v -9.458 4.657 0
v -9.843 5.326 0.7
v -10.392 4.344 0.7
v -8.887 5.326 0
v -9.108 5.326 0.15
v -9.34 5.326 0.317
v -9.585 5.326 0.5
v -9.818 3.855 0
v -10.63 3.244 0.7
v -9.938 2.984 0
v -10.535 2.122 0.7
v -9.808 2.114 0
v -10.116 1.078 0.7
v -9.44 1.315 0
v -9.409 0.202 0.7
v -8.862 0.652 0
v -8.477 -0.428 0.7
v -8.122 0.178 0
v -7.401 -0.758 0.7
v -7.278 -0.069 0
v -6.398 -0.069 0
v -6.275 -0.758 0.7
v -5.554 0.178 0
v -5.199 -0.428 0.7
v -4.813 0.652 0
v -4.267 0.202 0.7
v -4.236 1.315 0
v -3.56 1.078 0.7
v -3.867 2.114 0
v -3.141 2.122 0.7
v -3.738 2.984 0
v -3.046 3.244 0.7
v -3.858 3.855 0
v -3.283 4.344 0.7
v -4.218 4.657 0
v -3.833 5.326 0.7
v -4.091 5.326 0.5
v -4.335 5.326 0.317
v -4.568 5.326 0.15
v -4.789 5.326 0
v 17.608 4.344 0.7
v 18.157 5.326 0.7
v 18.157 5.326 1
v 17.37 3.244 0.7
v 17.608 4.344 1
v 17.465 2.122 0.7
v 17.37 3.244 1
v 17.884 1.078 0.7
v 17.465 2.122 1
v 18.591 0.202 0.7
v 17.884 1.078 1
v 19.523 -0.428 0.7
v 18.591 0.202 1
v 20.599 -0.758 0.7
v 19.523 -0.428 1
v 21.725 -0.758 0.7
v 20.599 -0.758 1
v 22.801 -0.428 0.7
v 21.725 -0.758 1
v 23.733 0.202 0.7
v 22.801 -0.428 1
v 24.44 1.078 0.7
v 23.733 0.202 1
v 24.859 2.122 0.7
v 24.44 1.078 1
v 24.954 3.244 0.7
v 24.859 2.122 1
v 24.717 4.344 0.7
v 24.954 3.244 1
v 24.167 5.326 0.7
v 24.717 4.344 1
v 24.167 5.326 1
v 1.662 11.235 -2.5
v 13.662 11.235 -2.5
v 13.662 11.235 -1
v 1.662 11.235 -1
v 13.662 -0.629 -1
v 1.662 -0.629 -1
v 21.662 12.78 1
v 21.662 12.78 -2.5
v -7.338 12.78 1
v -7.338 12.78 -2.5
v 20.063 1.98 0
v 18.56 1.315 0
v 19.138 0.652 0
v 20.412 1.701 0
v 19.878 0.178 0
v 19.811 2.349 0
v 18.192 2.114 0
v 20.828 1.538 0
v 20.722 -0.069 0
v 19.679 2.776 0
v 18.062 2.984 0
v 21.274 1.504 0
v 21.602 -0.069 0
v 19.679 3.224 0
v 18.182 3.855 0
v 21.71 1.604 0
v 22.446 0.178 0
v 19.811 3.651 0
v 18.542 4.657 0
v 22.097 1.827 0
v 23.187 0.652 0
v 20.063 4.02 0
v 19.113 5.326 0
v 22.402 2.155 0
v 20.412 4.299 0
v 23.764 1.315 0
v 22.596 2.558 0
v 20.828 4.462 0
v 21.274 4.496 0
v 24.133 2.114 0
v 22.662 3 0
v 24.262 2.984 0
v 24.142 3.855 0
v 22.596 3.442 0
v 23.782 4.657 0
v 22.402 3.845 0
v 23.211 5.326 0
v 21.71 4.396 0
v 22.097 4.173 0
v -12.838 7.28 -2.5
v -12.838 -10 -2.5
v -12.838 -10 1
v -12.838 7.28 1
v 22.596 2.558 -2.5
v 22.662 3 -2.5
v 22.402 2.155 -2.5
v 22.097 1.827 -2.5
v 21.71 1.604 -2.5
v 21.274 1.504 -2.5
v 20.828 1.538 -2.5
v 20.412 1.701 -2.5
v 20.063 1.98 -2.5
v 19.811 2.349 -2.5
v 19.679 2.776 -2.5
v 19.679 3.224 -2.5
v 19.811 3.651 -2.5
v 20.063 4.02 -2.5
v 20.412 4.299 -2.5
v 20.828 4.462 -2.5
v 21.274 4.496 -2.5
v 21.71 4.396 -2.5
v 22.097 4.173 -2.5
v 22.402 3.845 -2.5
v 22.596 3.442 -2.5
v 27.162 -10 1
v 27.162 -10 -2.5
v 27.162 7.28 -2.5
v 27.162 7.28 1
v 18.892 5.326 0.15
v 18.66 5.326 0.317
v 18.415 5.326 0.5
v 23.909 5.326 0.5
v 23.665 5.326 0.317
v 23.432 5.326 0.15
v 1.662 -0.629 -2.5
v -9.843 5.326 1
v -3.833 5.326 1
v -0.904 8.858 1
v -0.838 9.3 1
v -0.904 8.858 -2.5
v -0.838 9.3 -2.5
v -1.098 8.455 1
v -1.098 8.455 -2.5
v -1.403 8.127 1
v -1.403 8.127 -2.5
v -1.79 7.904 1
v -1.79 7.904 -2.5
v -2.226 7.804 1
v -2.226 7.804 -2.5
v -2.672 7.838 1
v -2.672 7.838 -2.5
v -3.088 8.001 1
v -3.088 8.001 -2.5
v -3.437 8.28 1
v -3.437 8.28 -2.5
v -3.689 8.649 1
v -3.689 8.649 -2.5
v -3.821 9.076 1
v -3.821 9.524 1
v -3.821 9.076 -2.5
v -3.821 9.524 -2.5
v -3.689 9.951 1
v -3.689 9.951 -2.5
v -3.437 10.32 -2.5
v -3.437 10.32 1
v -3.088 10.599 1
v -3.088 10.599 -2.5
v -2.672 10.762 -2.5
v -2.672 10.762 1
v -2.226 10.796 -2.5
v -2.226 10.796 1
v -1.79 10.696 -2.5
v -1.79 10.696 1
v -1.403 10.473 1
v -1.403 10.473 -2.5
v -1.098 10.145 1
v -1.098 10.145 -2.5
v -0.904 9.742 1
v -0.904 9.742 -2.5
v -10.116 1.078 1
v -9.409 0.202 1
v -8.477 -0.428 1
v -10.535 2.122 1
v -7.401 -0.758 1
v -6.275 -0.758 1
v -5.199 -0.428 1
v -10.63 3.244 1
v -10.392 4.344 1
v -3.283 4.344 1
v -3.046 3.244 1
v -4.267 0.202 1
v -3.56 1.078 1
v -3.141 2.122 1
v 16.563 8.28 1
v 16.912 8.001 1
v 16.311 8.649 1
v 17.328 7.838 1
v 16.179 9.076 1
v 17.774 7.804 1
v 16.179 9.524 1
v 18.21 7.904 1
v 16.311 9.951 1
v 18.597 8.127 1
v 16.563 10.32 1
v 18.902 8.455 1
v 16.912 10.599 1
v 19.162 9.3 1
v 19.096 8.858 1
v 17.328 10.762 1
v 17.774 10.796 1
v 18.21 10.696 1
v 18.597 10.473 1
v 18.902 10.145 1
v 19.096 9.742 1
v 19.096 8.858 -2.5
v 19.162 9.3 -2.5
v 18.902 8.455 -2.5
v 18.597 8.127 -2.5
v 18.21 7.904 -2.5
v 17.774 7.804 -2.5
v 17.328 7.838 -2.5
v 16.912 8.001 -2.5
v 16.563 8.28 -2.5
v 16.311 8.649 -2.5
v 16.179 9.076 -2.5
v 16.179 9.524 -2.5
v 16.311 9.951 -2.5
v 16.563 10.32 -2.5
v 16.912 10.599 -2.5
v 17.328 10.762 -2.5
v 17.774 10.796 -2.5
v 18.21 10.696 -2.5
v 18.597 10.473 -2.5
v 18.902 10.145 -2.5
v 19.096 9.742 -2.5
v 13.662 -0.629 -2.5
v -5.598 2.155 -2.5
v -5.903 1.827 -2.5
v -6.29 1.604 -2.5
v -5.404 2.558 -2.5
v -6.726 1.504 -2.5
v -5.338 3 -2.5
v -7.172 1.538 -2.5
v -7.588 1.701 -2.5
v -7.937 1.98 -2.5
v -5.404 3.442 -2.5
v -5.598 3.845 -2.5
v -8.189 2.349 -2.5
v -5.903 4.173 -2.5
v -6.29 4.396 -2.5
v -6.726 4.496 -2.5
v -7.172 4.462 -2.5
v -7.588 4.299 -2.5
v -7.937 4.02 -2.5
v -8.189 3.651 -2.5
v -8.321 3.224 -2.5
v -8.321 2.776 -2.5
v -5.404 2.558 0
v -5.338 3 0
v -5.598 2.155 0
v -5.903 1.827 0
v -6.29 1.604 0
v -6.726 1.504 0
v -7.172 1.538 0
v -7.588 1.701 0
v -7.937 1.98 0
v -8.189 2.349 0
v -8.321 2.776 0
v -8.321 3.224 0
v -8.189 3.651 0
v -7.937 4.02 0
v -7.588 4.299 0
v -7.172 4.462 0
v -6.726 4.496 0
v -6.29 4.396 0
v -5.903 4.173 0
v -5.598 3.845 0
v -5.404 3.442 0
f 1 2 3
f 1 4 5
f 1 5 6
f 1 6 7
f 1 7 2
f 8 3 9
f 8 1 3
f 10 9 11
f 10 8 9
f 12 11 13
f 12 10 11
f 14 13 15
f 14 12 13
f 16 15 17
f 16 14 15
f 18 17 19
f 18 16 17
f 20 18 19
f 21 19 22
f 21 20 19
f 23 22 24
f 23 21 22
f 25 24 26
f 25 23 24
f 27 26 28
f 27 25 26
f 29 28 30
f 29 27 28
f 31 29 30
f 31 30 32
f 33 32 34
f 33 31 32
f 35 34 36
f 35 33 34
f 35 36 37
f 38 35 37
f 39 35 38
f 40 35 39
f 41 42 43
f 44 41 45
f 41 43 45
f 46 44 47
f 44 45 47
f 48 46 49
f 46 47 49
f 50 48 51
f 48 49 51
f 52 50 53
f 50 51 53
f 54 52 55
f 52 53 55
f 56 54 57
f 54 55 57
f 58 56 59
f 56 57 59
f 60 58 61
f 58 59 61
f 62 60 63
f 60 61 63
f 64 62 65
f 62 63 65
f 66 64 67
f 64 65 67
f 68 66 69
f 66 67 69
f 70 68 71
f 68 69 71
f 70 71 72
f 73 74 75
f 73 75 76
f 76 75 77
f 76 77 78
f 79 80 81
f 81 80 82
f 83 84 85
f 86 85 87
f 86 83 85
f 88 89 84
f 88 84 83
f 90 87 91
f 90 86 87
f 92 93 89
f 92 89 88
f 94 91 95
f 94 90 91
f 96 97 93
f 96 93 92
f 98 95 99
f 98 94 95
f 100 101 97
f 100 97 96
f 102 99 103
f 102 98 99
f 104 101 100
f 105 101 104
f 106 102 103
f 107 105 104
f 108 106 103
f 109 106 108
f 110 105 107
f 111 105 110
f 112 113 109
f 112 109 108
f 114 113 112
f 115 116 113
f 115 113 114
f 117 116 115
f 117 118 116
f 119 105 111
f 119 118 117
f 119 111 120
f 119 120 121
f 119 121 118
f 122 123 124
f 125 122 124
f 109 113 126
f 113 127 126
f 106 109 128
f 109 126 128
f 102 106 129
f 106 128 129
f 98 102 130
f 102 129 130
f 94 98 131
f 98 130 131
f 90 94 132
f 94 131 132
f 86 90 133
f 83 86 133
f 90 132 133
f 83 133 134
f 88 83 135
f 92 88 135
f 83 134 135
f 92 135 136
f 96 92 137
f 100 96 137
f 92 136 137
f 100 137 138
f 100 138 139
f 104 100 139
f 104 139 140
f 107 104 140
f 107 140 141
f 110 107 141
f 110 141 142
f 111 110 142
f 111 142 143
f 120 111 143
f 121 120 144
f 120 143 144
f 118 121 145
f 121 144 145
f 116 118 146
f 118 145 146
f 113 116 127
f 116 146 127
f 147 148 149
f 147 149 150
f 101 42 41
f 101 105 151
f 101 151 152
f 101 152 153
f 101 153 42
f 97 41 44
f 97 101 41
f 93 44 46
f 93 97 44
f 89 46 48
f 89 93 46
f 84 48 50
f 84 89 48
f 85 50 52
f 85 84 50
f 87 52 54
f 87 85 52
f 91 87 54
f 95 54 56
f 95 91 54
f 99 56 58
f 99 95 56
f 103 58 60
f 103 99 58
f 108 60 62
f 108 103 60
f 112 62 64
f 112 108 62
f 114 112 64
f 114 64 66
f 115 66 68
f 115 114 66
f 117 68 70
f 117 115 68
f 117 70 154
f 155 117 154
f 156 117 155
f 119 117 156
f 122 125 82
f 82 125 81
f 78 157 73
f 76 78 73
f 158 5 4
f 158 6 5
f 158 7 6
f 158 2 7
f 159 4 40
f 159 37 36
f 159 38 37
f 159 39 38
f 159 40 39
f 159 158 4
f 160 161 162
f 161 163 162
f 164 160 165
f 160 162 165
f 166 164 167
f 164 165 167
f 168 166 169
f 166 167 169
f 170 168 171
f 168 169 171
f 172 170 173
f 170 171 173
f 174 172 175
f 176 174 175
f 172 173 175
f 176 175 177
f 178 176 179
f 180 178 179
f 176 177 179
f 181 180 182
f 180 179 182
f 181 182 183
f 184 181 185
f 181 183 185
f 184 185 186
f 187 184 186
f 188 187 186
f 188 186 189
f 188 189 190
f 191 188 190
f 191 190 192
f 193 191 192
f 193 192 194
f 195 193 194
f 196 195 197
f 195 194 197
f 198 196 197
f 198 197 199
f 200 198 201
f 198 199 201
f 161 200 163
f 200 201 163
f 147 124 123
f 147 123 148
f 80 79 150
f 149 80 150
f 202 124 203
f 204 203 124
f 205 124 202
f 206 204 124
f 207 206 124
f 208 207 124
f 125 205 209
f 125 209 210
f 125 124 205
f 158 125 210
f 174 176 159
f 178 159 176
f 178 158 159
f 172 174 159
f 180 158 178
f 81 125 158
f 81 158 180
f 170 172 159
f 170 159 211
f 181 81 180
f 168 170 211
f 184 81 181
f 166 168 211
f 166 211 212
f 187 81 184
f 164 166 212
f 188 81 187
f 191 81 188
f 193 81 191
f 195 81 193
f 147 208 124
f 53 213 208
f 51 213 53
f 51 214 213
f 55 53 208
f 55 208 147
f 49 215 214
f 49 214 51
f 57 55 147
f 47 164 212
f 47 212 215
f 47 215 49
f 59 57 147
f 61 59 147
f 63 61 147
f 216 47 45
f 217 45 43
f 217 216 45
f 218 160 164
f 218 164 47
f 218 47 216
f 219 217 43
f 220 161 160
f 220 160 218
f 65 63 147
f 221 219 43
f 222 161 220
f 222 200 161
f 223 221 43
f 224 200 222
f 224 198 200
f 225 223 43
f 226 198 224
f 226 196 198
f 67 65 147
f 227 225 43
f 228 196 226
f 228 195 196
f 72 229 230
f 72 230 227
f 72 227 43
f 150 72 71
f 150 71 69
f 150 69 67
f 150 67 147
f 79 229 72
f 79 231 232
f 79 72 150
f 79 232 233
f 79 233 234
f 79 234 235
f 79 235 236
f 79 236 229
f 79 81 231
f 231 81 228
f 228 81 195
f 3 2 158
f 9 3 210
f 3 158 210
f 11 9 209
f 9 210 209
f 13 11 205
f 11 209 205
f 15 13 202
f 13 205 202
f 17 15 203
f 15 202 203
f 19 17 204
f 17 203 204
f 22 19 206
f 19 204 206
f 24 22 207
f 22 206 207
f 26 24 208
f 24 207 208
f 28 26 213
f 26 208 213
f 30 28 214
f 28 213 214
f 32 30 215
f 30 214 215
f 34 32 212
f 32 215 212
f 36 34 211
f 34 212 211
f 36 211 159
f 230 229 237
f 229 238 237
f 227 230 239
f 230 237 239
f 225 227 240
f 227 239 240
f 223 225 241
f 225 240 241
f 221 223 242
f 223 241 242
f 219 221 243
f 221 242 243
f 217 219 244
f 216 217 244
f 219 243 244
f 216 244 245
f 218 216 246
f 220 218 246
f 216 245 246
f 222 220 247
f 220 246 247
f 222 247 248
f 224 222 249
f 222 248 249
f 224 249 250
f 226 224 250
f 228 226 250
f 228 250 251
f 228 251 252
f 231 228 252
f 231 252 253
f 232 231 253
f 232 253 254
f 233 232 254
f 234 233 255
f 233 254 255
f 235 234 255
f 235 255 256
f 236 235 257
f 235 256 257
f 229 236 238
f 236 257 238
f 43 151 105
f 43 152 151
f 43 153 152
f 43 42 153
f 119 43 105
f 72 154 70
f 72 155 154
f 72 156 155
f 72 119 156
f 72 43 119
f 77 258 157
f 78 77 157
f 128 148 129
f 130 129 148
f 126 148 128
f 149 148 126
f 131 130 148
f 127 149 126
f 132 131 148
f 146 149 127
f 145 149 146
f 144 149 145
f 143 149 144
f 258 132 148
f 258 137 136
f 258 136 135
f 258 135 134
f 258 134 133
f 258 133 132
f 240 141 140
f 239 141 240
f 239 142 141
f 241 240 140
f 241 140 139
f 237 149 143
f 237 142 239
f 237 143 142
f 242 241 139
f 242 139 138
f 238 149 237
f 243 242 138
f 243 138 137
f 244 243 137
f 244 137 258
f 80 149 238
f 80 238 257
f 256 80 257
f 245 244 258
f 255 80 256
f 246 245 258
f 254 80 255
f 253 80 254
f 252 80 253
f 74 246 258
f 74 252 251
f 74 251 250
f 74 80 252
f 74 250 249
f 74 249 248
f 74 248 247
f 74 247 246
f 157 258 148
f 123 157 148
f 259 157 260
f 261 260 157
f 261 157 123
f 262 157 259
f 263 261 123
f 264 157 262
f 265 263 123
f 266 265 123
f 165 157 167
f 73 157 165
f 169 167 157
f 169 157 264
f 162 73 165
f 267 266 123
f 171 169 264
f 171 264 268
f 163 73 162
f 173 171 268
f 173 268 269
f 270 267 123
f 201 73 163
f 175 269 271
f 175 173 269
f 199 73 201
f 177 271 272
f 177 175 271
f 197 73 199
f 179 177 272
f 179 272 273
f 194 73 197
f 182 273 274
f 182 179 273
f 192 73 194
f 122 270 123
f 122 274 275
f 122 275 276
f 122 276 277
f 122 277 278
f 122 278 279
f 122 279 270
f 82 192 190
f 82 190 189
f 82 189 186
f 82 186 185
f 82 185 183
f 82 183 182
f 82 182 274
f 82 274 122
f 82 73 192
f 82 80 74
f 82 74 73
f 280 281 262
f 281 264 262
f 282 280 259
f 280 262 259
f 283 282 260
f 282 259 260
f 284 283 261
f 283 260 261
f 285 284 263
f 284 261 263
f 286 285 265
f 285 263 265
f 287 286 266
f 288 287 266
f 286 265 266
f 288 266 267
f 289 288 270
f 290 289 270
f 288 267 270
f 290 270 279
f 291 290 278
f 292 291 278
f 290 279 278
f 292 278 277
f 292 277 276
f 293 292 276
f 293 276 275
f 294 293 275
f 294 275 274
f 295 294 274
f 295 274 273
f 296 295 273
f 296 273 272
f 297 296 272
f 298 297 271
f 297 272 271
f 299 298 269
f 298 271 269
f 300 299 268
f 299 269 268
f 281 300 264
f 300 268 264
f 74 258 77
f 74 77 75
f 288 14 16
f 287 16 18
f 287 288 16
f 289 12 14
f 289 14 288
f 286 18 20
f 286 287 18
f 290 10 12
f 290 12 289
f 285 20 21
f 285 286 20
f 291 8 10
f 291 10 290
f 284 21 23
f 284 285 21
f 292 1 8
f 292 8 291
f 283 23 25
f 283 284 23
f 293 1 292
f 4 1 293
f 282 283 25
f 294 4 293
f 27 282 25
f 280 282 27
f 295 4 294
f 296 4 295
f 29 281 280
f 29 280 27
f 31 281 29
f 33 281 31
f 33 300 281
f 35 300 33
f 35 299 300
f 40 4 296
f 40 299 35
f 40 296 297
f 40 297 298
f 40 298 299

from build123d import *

# Parameters (mm, degrees)
SKETCH_1_W          = 40
SKETCH_1_H          = 2.5
EXTRUDE_1_DEPTH     = 18.5
SKETCH_2_R          = 1.5
CUT_EXTRUDE_1_DEPTH = 33.958808433
SKETCH_3_R          = 1.5
CUT_EXTRUDE_2_DEPTH = 40
SKETCH_4_W          = 40
SKETCH_4_H          = 5.719865779
CUT_EXTRUDE_3_DEPTH = 40
SKETCH_5_W          = 40
SKETCH_5_H          = 12.780134221
EXTRUDE_2_DEPTH     = 1
SKETCH_6_R          = 1.5
CUT_EXTRUDE_4_DEPTH = 31.221927206
SKETCH_8_W          = 40
SKETCH_8_H          = 3.5
EXTRUDE_3_DEPTH     = 5
SKETCH_9_R          = 3.8
CUT_EXTRUDE_5_DEPTH = 1
SKETCH_10_W         = 12
SKETCH_10_H         = 17.780134221
CUT_EXTRUDE_6_DEPTH = 1.5
CHAMFER_3_SIZE      = 0.7
CUT_EXTRUDE_7_DEPTH = 31.221927206
SKETCH_12_W         = 40
SKETCH_12_H         = 1.953894505
EXTRUDE_5_DEPTH     = 2
SKETCH_13_W         = 40
SKETCH_13_H         = 3.5
EXTRUDE_6_DEPTH     = 5
SKETCH_14_W         = 12
SKETCH_14_H         = 4.371099825
EXTRUDE_7_DEPTH     = 2
SKETCH_15_W         = 12
SKETCH_15_H         = 1.544999831
EXTRUDE_8_DEPTH     = 2


with BuildPart() as part:
    # Эскиз1 → Бобышка-Вытянуть1 (new body)
    with BuildSketch(Plane(origin=(0, 0, 0), x_dir=(1, 0, 0), z_dir=(0, 1, 0))):
        with Locations((7.162162162, 1.25)):
            Rectangle(SKETCH_1_W, SKETCH_1_H)
    extrude(amount=EXTRUDE_1_DEPTH)

    # Эскиз2 → Вырез-Вытянуть1 (cut, through all)
    with BuildSketch(Plane.XY):
        with Locations((-6.837837838, 3)):
            Circle(SKETCH_2_R)
        with Locations((21.162162162, 3)):
            Circle(SKETCH_2_R)
    extrude(amount=-CUT_EXTRUDE_1_DEPTH, mode=Mode.SUBTRACT)

    # Эскиз3 → Вырез-Вытянуть2 (cut)
    with BuildSketch(Plane.XY):
        with Locations((-2.337837838, 9.3)):
            Circle(SKETCH_3_R)
        with Locations((17.662162162, 9.3)):
            Circle(SKETCH_3_R)
    extrude(amount=-CUT_EXTRUDE_2_DEPTH, mode=Mode.SUBTRACT)

    # Эскиз4 → Вырез-Вытянуть3 (cut)
    with BuildSketch(Plane.XY):
        with Locations((7.162162162, 15.640067111)):
            Rectangle(SKETCH_4_W, SKETCH_4_H)
    extrude(amount=-CUT_EXTRUDE_3_DEPTH, mode=Mode.SUBTRACT)

    # Эскиз5 → Бобышка-Вытянуть2 (add)
    with BuildSketch(Plane.XY):
        with Locations((7.162162162, 6.390067111)):
            Rectangle(SKETCH_5_W, SKETCH_5_H)
    extrude(amount=EXTRUDE_2_DEPTH)

    # Эскиз6 → Вырез-Вытянуть4 (cut, through all)
    with BuildSketch(Plane(origin=(0, 0, -2.5), x_dir=(-1, 0, 0), z_dir=(0, 0, -1))):
        with Locations(Location((-17.662162162, 9.3, 0), (0, 0, 180))):
            Circle(SKETCH_6_R)
        with Locations(Location((2.337837838, 9.3, 0), (0, 0, 180))):
            Circle(SKETCH_6_R)
        with Locations(Location((6.837837838, 3, 0), (0, 0, 180))):
            Circle(SKETCH_6_R)
        with Locations(Location((-21.162162162, 3, 0), (0, 0, 180))):
            Circle(SKETCH_6_R)
    extrude(amount=-CUT_EXTRUDE_4_DEPTH, mode=Mode.SUBTRACT)

    # Эскиз8 → Бобышка-Вытянуть3 (add)
    with BuildSketch(Plane.XZ):
        with Locations((7.162162162, -0.75)):
            Rectangle(SKETCH_8_W, SKETCH_8_H)
    extrude(amount=EXTRUDE_3_DEPTH)

    # Эскиз9 → Вырез-Вытянуть5 (cut)
    with BuildSketch(Plane.XY.offset(1)):
        with Locations((-6.837837838, 3)):
            Circle(SKETCH_9_R)
        with Locations((21.162162162, 3)):
            Circle(SKETCH_9_R)
    extrude(amount=-CUT_EXTRUDE_5_DEPTH, mode=Mode.SUBTRACT)

    # Эскиз10 → Вырез-Вытянуть6 (cut)
    with BuildSketch(Plane(origin=(0, 0, -2.5), x_dir=(-1, 0, 0), z_dir=(0, 0, -1))):
        with Locations((-7.662162162, 3.890067111)):
            Rectangle(SKETCH_10_W, SKETCH_10_H)
    extrude(amount=-CUT_EXTRUDE_6_DEPTH, mode=Mode.SUBTRACT)

    # Фаска3
    chamfer_3_edges = [part.edges().sort_by_distance(p)[0] for p in [
        (-10.637837838, 3, 0),
        (17.362162162, 3, 0),
    ]]
    chamfer(chamfer_3_edges, length=CHAMFER_3_SIZE)

    # Эскиз11 → Вырез-Вытянуть7 (cut, through all)
    with BuildSketch(Plane.XY.offset(1)):
        Polygon((-12.837837838, 12.780134221), (-12.837837838, 7.280134221), (-7.337837838, 12.780134221), align=None)
        Polygon((27.162162162, 12.780134221), (21.662162162, 12.780134221), (27.162162162, 7.280134221), align=None)
    extrude(amount=-CUT_EXTRUDE_7_DEPTH, mode=Mode.SUBTRACT)

    # Эскиз12 → Бобышка-Вытянуть5 (add)
    with BuildSketch(Plane.XY.offset(1)):
        with Locations((7.162162162, 6.303186969)):
            Rectangle(SKETCH_12_W, SKETCH_12_H)
    extrude(amount=-EXTRUDE_5_DEPTH)

    # Эскиз13 → Бобышка-Вытянуть6 (add)
    with BuildSketch(Plane.XZ.offset(5)):
        with Locations((7.162162162, -0.75)):
            Rectangle(SKETCH_13_W, SKETCH_13_H)
    extrude(amount=EXTRUDE_6_DEPTH)

    # Эскиз14 → Бобышка-Вытянуть7 (add)
    with BuildSketch(Plane(origin=(0, 0, -2.5), x_dir=(-1, 0, 0), z_dir=(0, 0, -1))):
        with Locations((-7.662162162, -2.814450088)):
            Rectangle(SKETCH_14_W, SKETCH_14_H)
    extrude(amount=-EXTRUDE_7_DEPTH)

    # Эскиз15 → Бобышка-Вытянуть8 (add)
    with BuildSketch(Plane(origin=(0, 0, -2.5), x_dir=(-1, 0, 0), z_dir=(0, 0, -1))):
        with Locations((-7.662162162, 12.007634306)):
            Rectangle(SKETCH_15_W, SKETCH_15_H)
    extrude(amount=-EXTRUDE_8_DEPTH)


solid = part.part
